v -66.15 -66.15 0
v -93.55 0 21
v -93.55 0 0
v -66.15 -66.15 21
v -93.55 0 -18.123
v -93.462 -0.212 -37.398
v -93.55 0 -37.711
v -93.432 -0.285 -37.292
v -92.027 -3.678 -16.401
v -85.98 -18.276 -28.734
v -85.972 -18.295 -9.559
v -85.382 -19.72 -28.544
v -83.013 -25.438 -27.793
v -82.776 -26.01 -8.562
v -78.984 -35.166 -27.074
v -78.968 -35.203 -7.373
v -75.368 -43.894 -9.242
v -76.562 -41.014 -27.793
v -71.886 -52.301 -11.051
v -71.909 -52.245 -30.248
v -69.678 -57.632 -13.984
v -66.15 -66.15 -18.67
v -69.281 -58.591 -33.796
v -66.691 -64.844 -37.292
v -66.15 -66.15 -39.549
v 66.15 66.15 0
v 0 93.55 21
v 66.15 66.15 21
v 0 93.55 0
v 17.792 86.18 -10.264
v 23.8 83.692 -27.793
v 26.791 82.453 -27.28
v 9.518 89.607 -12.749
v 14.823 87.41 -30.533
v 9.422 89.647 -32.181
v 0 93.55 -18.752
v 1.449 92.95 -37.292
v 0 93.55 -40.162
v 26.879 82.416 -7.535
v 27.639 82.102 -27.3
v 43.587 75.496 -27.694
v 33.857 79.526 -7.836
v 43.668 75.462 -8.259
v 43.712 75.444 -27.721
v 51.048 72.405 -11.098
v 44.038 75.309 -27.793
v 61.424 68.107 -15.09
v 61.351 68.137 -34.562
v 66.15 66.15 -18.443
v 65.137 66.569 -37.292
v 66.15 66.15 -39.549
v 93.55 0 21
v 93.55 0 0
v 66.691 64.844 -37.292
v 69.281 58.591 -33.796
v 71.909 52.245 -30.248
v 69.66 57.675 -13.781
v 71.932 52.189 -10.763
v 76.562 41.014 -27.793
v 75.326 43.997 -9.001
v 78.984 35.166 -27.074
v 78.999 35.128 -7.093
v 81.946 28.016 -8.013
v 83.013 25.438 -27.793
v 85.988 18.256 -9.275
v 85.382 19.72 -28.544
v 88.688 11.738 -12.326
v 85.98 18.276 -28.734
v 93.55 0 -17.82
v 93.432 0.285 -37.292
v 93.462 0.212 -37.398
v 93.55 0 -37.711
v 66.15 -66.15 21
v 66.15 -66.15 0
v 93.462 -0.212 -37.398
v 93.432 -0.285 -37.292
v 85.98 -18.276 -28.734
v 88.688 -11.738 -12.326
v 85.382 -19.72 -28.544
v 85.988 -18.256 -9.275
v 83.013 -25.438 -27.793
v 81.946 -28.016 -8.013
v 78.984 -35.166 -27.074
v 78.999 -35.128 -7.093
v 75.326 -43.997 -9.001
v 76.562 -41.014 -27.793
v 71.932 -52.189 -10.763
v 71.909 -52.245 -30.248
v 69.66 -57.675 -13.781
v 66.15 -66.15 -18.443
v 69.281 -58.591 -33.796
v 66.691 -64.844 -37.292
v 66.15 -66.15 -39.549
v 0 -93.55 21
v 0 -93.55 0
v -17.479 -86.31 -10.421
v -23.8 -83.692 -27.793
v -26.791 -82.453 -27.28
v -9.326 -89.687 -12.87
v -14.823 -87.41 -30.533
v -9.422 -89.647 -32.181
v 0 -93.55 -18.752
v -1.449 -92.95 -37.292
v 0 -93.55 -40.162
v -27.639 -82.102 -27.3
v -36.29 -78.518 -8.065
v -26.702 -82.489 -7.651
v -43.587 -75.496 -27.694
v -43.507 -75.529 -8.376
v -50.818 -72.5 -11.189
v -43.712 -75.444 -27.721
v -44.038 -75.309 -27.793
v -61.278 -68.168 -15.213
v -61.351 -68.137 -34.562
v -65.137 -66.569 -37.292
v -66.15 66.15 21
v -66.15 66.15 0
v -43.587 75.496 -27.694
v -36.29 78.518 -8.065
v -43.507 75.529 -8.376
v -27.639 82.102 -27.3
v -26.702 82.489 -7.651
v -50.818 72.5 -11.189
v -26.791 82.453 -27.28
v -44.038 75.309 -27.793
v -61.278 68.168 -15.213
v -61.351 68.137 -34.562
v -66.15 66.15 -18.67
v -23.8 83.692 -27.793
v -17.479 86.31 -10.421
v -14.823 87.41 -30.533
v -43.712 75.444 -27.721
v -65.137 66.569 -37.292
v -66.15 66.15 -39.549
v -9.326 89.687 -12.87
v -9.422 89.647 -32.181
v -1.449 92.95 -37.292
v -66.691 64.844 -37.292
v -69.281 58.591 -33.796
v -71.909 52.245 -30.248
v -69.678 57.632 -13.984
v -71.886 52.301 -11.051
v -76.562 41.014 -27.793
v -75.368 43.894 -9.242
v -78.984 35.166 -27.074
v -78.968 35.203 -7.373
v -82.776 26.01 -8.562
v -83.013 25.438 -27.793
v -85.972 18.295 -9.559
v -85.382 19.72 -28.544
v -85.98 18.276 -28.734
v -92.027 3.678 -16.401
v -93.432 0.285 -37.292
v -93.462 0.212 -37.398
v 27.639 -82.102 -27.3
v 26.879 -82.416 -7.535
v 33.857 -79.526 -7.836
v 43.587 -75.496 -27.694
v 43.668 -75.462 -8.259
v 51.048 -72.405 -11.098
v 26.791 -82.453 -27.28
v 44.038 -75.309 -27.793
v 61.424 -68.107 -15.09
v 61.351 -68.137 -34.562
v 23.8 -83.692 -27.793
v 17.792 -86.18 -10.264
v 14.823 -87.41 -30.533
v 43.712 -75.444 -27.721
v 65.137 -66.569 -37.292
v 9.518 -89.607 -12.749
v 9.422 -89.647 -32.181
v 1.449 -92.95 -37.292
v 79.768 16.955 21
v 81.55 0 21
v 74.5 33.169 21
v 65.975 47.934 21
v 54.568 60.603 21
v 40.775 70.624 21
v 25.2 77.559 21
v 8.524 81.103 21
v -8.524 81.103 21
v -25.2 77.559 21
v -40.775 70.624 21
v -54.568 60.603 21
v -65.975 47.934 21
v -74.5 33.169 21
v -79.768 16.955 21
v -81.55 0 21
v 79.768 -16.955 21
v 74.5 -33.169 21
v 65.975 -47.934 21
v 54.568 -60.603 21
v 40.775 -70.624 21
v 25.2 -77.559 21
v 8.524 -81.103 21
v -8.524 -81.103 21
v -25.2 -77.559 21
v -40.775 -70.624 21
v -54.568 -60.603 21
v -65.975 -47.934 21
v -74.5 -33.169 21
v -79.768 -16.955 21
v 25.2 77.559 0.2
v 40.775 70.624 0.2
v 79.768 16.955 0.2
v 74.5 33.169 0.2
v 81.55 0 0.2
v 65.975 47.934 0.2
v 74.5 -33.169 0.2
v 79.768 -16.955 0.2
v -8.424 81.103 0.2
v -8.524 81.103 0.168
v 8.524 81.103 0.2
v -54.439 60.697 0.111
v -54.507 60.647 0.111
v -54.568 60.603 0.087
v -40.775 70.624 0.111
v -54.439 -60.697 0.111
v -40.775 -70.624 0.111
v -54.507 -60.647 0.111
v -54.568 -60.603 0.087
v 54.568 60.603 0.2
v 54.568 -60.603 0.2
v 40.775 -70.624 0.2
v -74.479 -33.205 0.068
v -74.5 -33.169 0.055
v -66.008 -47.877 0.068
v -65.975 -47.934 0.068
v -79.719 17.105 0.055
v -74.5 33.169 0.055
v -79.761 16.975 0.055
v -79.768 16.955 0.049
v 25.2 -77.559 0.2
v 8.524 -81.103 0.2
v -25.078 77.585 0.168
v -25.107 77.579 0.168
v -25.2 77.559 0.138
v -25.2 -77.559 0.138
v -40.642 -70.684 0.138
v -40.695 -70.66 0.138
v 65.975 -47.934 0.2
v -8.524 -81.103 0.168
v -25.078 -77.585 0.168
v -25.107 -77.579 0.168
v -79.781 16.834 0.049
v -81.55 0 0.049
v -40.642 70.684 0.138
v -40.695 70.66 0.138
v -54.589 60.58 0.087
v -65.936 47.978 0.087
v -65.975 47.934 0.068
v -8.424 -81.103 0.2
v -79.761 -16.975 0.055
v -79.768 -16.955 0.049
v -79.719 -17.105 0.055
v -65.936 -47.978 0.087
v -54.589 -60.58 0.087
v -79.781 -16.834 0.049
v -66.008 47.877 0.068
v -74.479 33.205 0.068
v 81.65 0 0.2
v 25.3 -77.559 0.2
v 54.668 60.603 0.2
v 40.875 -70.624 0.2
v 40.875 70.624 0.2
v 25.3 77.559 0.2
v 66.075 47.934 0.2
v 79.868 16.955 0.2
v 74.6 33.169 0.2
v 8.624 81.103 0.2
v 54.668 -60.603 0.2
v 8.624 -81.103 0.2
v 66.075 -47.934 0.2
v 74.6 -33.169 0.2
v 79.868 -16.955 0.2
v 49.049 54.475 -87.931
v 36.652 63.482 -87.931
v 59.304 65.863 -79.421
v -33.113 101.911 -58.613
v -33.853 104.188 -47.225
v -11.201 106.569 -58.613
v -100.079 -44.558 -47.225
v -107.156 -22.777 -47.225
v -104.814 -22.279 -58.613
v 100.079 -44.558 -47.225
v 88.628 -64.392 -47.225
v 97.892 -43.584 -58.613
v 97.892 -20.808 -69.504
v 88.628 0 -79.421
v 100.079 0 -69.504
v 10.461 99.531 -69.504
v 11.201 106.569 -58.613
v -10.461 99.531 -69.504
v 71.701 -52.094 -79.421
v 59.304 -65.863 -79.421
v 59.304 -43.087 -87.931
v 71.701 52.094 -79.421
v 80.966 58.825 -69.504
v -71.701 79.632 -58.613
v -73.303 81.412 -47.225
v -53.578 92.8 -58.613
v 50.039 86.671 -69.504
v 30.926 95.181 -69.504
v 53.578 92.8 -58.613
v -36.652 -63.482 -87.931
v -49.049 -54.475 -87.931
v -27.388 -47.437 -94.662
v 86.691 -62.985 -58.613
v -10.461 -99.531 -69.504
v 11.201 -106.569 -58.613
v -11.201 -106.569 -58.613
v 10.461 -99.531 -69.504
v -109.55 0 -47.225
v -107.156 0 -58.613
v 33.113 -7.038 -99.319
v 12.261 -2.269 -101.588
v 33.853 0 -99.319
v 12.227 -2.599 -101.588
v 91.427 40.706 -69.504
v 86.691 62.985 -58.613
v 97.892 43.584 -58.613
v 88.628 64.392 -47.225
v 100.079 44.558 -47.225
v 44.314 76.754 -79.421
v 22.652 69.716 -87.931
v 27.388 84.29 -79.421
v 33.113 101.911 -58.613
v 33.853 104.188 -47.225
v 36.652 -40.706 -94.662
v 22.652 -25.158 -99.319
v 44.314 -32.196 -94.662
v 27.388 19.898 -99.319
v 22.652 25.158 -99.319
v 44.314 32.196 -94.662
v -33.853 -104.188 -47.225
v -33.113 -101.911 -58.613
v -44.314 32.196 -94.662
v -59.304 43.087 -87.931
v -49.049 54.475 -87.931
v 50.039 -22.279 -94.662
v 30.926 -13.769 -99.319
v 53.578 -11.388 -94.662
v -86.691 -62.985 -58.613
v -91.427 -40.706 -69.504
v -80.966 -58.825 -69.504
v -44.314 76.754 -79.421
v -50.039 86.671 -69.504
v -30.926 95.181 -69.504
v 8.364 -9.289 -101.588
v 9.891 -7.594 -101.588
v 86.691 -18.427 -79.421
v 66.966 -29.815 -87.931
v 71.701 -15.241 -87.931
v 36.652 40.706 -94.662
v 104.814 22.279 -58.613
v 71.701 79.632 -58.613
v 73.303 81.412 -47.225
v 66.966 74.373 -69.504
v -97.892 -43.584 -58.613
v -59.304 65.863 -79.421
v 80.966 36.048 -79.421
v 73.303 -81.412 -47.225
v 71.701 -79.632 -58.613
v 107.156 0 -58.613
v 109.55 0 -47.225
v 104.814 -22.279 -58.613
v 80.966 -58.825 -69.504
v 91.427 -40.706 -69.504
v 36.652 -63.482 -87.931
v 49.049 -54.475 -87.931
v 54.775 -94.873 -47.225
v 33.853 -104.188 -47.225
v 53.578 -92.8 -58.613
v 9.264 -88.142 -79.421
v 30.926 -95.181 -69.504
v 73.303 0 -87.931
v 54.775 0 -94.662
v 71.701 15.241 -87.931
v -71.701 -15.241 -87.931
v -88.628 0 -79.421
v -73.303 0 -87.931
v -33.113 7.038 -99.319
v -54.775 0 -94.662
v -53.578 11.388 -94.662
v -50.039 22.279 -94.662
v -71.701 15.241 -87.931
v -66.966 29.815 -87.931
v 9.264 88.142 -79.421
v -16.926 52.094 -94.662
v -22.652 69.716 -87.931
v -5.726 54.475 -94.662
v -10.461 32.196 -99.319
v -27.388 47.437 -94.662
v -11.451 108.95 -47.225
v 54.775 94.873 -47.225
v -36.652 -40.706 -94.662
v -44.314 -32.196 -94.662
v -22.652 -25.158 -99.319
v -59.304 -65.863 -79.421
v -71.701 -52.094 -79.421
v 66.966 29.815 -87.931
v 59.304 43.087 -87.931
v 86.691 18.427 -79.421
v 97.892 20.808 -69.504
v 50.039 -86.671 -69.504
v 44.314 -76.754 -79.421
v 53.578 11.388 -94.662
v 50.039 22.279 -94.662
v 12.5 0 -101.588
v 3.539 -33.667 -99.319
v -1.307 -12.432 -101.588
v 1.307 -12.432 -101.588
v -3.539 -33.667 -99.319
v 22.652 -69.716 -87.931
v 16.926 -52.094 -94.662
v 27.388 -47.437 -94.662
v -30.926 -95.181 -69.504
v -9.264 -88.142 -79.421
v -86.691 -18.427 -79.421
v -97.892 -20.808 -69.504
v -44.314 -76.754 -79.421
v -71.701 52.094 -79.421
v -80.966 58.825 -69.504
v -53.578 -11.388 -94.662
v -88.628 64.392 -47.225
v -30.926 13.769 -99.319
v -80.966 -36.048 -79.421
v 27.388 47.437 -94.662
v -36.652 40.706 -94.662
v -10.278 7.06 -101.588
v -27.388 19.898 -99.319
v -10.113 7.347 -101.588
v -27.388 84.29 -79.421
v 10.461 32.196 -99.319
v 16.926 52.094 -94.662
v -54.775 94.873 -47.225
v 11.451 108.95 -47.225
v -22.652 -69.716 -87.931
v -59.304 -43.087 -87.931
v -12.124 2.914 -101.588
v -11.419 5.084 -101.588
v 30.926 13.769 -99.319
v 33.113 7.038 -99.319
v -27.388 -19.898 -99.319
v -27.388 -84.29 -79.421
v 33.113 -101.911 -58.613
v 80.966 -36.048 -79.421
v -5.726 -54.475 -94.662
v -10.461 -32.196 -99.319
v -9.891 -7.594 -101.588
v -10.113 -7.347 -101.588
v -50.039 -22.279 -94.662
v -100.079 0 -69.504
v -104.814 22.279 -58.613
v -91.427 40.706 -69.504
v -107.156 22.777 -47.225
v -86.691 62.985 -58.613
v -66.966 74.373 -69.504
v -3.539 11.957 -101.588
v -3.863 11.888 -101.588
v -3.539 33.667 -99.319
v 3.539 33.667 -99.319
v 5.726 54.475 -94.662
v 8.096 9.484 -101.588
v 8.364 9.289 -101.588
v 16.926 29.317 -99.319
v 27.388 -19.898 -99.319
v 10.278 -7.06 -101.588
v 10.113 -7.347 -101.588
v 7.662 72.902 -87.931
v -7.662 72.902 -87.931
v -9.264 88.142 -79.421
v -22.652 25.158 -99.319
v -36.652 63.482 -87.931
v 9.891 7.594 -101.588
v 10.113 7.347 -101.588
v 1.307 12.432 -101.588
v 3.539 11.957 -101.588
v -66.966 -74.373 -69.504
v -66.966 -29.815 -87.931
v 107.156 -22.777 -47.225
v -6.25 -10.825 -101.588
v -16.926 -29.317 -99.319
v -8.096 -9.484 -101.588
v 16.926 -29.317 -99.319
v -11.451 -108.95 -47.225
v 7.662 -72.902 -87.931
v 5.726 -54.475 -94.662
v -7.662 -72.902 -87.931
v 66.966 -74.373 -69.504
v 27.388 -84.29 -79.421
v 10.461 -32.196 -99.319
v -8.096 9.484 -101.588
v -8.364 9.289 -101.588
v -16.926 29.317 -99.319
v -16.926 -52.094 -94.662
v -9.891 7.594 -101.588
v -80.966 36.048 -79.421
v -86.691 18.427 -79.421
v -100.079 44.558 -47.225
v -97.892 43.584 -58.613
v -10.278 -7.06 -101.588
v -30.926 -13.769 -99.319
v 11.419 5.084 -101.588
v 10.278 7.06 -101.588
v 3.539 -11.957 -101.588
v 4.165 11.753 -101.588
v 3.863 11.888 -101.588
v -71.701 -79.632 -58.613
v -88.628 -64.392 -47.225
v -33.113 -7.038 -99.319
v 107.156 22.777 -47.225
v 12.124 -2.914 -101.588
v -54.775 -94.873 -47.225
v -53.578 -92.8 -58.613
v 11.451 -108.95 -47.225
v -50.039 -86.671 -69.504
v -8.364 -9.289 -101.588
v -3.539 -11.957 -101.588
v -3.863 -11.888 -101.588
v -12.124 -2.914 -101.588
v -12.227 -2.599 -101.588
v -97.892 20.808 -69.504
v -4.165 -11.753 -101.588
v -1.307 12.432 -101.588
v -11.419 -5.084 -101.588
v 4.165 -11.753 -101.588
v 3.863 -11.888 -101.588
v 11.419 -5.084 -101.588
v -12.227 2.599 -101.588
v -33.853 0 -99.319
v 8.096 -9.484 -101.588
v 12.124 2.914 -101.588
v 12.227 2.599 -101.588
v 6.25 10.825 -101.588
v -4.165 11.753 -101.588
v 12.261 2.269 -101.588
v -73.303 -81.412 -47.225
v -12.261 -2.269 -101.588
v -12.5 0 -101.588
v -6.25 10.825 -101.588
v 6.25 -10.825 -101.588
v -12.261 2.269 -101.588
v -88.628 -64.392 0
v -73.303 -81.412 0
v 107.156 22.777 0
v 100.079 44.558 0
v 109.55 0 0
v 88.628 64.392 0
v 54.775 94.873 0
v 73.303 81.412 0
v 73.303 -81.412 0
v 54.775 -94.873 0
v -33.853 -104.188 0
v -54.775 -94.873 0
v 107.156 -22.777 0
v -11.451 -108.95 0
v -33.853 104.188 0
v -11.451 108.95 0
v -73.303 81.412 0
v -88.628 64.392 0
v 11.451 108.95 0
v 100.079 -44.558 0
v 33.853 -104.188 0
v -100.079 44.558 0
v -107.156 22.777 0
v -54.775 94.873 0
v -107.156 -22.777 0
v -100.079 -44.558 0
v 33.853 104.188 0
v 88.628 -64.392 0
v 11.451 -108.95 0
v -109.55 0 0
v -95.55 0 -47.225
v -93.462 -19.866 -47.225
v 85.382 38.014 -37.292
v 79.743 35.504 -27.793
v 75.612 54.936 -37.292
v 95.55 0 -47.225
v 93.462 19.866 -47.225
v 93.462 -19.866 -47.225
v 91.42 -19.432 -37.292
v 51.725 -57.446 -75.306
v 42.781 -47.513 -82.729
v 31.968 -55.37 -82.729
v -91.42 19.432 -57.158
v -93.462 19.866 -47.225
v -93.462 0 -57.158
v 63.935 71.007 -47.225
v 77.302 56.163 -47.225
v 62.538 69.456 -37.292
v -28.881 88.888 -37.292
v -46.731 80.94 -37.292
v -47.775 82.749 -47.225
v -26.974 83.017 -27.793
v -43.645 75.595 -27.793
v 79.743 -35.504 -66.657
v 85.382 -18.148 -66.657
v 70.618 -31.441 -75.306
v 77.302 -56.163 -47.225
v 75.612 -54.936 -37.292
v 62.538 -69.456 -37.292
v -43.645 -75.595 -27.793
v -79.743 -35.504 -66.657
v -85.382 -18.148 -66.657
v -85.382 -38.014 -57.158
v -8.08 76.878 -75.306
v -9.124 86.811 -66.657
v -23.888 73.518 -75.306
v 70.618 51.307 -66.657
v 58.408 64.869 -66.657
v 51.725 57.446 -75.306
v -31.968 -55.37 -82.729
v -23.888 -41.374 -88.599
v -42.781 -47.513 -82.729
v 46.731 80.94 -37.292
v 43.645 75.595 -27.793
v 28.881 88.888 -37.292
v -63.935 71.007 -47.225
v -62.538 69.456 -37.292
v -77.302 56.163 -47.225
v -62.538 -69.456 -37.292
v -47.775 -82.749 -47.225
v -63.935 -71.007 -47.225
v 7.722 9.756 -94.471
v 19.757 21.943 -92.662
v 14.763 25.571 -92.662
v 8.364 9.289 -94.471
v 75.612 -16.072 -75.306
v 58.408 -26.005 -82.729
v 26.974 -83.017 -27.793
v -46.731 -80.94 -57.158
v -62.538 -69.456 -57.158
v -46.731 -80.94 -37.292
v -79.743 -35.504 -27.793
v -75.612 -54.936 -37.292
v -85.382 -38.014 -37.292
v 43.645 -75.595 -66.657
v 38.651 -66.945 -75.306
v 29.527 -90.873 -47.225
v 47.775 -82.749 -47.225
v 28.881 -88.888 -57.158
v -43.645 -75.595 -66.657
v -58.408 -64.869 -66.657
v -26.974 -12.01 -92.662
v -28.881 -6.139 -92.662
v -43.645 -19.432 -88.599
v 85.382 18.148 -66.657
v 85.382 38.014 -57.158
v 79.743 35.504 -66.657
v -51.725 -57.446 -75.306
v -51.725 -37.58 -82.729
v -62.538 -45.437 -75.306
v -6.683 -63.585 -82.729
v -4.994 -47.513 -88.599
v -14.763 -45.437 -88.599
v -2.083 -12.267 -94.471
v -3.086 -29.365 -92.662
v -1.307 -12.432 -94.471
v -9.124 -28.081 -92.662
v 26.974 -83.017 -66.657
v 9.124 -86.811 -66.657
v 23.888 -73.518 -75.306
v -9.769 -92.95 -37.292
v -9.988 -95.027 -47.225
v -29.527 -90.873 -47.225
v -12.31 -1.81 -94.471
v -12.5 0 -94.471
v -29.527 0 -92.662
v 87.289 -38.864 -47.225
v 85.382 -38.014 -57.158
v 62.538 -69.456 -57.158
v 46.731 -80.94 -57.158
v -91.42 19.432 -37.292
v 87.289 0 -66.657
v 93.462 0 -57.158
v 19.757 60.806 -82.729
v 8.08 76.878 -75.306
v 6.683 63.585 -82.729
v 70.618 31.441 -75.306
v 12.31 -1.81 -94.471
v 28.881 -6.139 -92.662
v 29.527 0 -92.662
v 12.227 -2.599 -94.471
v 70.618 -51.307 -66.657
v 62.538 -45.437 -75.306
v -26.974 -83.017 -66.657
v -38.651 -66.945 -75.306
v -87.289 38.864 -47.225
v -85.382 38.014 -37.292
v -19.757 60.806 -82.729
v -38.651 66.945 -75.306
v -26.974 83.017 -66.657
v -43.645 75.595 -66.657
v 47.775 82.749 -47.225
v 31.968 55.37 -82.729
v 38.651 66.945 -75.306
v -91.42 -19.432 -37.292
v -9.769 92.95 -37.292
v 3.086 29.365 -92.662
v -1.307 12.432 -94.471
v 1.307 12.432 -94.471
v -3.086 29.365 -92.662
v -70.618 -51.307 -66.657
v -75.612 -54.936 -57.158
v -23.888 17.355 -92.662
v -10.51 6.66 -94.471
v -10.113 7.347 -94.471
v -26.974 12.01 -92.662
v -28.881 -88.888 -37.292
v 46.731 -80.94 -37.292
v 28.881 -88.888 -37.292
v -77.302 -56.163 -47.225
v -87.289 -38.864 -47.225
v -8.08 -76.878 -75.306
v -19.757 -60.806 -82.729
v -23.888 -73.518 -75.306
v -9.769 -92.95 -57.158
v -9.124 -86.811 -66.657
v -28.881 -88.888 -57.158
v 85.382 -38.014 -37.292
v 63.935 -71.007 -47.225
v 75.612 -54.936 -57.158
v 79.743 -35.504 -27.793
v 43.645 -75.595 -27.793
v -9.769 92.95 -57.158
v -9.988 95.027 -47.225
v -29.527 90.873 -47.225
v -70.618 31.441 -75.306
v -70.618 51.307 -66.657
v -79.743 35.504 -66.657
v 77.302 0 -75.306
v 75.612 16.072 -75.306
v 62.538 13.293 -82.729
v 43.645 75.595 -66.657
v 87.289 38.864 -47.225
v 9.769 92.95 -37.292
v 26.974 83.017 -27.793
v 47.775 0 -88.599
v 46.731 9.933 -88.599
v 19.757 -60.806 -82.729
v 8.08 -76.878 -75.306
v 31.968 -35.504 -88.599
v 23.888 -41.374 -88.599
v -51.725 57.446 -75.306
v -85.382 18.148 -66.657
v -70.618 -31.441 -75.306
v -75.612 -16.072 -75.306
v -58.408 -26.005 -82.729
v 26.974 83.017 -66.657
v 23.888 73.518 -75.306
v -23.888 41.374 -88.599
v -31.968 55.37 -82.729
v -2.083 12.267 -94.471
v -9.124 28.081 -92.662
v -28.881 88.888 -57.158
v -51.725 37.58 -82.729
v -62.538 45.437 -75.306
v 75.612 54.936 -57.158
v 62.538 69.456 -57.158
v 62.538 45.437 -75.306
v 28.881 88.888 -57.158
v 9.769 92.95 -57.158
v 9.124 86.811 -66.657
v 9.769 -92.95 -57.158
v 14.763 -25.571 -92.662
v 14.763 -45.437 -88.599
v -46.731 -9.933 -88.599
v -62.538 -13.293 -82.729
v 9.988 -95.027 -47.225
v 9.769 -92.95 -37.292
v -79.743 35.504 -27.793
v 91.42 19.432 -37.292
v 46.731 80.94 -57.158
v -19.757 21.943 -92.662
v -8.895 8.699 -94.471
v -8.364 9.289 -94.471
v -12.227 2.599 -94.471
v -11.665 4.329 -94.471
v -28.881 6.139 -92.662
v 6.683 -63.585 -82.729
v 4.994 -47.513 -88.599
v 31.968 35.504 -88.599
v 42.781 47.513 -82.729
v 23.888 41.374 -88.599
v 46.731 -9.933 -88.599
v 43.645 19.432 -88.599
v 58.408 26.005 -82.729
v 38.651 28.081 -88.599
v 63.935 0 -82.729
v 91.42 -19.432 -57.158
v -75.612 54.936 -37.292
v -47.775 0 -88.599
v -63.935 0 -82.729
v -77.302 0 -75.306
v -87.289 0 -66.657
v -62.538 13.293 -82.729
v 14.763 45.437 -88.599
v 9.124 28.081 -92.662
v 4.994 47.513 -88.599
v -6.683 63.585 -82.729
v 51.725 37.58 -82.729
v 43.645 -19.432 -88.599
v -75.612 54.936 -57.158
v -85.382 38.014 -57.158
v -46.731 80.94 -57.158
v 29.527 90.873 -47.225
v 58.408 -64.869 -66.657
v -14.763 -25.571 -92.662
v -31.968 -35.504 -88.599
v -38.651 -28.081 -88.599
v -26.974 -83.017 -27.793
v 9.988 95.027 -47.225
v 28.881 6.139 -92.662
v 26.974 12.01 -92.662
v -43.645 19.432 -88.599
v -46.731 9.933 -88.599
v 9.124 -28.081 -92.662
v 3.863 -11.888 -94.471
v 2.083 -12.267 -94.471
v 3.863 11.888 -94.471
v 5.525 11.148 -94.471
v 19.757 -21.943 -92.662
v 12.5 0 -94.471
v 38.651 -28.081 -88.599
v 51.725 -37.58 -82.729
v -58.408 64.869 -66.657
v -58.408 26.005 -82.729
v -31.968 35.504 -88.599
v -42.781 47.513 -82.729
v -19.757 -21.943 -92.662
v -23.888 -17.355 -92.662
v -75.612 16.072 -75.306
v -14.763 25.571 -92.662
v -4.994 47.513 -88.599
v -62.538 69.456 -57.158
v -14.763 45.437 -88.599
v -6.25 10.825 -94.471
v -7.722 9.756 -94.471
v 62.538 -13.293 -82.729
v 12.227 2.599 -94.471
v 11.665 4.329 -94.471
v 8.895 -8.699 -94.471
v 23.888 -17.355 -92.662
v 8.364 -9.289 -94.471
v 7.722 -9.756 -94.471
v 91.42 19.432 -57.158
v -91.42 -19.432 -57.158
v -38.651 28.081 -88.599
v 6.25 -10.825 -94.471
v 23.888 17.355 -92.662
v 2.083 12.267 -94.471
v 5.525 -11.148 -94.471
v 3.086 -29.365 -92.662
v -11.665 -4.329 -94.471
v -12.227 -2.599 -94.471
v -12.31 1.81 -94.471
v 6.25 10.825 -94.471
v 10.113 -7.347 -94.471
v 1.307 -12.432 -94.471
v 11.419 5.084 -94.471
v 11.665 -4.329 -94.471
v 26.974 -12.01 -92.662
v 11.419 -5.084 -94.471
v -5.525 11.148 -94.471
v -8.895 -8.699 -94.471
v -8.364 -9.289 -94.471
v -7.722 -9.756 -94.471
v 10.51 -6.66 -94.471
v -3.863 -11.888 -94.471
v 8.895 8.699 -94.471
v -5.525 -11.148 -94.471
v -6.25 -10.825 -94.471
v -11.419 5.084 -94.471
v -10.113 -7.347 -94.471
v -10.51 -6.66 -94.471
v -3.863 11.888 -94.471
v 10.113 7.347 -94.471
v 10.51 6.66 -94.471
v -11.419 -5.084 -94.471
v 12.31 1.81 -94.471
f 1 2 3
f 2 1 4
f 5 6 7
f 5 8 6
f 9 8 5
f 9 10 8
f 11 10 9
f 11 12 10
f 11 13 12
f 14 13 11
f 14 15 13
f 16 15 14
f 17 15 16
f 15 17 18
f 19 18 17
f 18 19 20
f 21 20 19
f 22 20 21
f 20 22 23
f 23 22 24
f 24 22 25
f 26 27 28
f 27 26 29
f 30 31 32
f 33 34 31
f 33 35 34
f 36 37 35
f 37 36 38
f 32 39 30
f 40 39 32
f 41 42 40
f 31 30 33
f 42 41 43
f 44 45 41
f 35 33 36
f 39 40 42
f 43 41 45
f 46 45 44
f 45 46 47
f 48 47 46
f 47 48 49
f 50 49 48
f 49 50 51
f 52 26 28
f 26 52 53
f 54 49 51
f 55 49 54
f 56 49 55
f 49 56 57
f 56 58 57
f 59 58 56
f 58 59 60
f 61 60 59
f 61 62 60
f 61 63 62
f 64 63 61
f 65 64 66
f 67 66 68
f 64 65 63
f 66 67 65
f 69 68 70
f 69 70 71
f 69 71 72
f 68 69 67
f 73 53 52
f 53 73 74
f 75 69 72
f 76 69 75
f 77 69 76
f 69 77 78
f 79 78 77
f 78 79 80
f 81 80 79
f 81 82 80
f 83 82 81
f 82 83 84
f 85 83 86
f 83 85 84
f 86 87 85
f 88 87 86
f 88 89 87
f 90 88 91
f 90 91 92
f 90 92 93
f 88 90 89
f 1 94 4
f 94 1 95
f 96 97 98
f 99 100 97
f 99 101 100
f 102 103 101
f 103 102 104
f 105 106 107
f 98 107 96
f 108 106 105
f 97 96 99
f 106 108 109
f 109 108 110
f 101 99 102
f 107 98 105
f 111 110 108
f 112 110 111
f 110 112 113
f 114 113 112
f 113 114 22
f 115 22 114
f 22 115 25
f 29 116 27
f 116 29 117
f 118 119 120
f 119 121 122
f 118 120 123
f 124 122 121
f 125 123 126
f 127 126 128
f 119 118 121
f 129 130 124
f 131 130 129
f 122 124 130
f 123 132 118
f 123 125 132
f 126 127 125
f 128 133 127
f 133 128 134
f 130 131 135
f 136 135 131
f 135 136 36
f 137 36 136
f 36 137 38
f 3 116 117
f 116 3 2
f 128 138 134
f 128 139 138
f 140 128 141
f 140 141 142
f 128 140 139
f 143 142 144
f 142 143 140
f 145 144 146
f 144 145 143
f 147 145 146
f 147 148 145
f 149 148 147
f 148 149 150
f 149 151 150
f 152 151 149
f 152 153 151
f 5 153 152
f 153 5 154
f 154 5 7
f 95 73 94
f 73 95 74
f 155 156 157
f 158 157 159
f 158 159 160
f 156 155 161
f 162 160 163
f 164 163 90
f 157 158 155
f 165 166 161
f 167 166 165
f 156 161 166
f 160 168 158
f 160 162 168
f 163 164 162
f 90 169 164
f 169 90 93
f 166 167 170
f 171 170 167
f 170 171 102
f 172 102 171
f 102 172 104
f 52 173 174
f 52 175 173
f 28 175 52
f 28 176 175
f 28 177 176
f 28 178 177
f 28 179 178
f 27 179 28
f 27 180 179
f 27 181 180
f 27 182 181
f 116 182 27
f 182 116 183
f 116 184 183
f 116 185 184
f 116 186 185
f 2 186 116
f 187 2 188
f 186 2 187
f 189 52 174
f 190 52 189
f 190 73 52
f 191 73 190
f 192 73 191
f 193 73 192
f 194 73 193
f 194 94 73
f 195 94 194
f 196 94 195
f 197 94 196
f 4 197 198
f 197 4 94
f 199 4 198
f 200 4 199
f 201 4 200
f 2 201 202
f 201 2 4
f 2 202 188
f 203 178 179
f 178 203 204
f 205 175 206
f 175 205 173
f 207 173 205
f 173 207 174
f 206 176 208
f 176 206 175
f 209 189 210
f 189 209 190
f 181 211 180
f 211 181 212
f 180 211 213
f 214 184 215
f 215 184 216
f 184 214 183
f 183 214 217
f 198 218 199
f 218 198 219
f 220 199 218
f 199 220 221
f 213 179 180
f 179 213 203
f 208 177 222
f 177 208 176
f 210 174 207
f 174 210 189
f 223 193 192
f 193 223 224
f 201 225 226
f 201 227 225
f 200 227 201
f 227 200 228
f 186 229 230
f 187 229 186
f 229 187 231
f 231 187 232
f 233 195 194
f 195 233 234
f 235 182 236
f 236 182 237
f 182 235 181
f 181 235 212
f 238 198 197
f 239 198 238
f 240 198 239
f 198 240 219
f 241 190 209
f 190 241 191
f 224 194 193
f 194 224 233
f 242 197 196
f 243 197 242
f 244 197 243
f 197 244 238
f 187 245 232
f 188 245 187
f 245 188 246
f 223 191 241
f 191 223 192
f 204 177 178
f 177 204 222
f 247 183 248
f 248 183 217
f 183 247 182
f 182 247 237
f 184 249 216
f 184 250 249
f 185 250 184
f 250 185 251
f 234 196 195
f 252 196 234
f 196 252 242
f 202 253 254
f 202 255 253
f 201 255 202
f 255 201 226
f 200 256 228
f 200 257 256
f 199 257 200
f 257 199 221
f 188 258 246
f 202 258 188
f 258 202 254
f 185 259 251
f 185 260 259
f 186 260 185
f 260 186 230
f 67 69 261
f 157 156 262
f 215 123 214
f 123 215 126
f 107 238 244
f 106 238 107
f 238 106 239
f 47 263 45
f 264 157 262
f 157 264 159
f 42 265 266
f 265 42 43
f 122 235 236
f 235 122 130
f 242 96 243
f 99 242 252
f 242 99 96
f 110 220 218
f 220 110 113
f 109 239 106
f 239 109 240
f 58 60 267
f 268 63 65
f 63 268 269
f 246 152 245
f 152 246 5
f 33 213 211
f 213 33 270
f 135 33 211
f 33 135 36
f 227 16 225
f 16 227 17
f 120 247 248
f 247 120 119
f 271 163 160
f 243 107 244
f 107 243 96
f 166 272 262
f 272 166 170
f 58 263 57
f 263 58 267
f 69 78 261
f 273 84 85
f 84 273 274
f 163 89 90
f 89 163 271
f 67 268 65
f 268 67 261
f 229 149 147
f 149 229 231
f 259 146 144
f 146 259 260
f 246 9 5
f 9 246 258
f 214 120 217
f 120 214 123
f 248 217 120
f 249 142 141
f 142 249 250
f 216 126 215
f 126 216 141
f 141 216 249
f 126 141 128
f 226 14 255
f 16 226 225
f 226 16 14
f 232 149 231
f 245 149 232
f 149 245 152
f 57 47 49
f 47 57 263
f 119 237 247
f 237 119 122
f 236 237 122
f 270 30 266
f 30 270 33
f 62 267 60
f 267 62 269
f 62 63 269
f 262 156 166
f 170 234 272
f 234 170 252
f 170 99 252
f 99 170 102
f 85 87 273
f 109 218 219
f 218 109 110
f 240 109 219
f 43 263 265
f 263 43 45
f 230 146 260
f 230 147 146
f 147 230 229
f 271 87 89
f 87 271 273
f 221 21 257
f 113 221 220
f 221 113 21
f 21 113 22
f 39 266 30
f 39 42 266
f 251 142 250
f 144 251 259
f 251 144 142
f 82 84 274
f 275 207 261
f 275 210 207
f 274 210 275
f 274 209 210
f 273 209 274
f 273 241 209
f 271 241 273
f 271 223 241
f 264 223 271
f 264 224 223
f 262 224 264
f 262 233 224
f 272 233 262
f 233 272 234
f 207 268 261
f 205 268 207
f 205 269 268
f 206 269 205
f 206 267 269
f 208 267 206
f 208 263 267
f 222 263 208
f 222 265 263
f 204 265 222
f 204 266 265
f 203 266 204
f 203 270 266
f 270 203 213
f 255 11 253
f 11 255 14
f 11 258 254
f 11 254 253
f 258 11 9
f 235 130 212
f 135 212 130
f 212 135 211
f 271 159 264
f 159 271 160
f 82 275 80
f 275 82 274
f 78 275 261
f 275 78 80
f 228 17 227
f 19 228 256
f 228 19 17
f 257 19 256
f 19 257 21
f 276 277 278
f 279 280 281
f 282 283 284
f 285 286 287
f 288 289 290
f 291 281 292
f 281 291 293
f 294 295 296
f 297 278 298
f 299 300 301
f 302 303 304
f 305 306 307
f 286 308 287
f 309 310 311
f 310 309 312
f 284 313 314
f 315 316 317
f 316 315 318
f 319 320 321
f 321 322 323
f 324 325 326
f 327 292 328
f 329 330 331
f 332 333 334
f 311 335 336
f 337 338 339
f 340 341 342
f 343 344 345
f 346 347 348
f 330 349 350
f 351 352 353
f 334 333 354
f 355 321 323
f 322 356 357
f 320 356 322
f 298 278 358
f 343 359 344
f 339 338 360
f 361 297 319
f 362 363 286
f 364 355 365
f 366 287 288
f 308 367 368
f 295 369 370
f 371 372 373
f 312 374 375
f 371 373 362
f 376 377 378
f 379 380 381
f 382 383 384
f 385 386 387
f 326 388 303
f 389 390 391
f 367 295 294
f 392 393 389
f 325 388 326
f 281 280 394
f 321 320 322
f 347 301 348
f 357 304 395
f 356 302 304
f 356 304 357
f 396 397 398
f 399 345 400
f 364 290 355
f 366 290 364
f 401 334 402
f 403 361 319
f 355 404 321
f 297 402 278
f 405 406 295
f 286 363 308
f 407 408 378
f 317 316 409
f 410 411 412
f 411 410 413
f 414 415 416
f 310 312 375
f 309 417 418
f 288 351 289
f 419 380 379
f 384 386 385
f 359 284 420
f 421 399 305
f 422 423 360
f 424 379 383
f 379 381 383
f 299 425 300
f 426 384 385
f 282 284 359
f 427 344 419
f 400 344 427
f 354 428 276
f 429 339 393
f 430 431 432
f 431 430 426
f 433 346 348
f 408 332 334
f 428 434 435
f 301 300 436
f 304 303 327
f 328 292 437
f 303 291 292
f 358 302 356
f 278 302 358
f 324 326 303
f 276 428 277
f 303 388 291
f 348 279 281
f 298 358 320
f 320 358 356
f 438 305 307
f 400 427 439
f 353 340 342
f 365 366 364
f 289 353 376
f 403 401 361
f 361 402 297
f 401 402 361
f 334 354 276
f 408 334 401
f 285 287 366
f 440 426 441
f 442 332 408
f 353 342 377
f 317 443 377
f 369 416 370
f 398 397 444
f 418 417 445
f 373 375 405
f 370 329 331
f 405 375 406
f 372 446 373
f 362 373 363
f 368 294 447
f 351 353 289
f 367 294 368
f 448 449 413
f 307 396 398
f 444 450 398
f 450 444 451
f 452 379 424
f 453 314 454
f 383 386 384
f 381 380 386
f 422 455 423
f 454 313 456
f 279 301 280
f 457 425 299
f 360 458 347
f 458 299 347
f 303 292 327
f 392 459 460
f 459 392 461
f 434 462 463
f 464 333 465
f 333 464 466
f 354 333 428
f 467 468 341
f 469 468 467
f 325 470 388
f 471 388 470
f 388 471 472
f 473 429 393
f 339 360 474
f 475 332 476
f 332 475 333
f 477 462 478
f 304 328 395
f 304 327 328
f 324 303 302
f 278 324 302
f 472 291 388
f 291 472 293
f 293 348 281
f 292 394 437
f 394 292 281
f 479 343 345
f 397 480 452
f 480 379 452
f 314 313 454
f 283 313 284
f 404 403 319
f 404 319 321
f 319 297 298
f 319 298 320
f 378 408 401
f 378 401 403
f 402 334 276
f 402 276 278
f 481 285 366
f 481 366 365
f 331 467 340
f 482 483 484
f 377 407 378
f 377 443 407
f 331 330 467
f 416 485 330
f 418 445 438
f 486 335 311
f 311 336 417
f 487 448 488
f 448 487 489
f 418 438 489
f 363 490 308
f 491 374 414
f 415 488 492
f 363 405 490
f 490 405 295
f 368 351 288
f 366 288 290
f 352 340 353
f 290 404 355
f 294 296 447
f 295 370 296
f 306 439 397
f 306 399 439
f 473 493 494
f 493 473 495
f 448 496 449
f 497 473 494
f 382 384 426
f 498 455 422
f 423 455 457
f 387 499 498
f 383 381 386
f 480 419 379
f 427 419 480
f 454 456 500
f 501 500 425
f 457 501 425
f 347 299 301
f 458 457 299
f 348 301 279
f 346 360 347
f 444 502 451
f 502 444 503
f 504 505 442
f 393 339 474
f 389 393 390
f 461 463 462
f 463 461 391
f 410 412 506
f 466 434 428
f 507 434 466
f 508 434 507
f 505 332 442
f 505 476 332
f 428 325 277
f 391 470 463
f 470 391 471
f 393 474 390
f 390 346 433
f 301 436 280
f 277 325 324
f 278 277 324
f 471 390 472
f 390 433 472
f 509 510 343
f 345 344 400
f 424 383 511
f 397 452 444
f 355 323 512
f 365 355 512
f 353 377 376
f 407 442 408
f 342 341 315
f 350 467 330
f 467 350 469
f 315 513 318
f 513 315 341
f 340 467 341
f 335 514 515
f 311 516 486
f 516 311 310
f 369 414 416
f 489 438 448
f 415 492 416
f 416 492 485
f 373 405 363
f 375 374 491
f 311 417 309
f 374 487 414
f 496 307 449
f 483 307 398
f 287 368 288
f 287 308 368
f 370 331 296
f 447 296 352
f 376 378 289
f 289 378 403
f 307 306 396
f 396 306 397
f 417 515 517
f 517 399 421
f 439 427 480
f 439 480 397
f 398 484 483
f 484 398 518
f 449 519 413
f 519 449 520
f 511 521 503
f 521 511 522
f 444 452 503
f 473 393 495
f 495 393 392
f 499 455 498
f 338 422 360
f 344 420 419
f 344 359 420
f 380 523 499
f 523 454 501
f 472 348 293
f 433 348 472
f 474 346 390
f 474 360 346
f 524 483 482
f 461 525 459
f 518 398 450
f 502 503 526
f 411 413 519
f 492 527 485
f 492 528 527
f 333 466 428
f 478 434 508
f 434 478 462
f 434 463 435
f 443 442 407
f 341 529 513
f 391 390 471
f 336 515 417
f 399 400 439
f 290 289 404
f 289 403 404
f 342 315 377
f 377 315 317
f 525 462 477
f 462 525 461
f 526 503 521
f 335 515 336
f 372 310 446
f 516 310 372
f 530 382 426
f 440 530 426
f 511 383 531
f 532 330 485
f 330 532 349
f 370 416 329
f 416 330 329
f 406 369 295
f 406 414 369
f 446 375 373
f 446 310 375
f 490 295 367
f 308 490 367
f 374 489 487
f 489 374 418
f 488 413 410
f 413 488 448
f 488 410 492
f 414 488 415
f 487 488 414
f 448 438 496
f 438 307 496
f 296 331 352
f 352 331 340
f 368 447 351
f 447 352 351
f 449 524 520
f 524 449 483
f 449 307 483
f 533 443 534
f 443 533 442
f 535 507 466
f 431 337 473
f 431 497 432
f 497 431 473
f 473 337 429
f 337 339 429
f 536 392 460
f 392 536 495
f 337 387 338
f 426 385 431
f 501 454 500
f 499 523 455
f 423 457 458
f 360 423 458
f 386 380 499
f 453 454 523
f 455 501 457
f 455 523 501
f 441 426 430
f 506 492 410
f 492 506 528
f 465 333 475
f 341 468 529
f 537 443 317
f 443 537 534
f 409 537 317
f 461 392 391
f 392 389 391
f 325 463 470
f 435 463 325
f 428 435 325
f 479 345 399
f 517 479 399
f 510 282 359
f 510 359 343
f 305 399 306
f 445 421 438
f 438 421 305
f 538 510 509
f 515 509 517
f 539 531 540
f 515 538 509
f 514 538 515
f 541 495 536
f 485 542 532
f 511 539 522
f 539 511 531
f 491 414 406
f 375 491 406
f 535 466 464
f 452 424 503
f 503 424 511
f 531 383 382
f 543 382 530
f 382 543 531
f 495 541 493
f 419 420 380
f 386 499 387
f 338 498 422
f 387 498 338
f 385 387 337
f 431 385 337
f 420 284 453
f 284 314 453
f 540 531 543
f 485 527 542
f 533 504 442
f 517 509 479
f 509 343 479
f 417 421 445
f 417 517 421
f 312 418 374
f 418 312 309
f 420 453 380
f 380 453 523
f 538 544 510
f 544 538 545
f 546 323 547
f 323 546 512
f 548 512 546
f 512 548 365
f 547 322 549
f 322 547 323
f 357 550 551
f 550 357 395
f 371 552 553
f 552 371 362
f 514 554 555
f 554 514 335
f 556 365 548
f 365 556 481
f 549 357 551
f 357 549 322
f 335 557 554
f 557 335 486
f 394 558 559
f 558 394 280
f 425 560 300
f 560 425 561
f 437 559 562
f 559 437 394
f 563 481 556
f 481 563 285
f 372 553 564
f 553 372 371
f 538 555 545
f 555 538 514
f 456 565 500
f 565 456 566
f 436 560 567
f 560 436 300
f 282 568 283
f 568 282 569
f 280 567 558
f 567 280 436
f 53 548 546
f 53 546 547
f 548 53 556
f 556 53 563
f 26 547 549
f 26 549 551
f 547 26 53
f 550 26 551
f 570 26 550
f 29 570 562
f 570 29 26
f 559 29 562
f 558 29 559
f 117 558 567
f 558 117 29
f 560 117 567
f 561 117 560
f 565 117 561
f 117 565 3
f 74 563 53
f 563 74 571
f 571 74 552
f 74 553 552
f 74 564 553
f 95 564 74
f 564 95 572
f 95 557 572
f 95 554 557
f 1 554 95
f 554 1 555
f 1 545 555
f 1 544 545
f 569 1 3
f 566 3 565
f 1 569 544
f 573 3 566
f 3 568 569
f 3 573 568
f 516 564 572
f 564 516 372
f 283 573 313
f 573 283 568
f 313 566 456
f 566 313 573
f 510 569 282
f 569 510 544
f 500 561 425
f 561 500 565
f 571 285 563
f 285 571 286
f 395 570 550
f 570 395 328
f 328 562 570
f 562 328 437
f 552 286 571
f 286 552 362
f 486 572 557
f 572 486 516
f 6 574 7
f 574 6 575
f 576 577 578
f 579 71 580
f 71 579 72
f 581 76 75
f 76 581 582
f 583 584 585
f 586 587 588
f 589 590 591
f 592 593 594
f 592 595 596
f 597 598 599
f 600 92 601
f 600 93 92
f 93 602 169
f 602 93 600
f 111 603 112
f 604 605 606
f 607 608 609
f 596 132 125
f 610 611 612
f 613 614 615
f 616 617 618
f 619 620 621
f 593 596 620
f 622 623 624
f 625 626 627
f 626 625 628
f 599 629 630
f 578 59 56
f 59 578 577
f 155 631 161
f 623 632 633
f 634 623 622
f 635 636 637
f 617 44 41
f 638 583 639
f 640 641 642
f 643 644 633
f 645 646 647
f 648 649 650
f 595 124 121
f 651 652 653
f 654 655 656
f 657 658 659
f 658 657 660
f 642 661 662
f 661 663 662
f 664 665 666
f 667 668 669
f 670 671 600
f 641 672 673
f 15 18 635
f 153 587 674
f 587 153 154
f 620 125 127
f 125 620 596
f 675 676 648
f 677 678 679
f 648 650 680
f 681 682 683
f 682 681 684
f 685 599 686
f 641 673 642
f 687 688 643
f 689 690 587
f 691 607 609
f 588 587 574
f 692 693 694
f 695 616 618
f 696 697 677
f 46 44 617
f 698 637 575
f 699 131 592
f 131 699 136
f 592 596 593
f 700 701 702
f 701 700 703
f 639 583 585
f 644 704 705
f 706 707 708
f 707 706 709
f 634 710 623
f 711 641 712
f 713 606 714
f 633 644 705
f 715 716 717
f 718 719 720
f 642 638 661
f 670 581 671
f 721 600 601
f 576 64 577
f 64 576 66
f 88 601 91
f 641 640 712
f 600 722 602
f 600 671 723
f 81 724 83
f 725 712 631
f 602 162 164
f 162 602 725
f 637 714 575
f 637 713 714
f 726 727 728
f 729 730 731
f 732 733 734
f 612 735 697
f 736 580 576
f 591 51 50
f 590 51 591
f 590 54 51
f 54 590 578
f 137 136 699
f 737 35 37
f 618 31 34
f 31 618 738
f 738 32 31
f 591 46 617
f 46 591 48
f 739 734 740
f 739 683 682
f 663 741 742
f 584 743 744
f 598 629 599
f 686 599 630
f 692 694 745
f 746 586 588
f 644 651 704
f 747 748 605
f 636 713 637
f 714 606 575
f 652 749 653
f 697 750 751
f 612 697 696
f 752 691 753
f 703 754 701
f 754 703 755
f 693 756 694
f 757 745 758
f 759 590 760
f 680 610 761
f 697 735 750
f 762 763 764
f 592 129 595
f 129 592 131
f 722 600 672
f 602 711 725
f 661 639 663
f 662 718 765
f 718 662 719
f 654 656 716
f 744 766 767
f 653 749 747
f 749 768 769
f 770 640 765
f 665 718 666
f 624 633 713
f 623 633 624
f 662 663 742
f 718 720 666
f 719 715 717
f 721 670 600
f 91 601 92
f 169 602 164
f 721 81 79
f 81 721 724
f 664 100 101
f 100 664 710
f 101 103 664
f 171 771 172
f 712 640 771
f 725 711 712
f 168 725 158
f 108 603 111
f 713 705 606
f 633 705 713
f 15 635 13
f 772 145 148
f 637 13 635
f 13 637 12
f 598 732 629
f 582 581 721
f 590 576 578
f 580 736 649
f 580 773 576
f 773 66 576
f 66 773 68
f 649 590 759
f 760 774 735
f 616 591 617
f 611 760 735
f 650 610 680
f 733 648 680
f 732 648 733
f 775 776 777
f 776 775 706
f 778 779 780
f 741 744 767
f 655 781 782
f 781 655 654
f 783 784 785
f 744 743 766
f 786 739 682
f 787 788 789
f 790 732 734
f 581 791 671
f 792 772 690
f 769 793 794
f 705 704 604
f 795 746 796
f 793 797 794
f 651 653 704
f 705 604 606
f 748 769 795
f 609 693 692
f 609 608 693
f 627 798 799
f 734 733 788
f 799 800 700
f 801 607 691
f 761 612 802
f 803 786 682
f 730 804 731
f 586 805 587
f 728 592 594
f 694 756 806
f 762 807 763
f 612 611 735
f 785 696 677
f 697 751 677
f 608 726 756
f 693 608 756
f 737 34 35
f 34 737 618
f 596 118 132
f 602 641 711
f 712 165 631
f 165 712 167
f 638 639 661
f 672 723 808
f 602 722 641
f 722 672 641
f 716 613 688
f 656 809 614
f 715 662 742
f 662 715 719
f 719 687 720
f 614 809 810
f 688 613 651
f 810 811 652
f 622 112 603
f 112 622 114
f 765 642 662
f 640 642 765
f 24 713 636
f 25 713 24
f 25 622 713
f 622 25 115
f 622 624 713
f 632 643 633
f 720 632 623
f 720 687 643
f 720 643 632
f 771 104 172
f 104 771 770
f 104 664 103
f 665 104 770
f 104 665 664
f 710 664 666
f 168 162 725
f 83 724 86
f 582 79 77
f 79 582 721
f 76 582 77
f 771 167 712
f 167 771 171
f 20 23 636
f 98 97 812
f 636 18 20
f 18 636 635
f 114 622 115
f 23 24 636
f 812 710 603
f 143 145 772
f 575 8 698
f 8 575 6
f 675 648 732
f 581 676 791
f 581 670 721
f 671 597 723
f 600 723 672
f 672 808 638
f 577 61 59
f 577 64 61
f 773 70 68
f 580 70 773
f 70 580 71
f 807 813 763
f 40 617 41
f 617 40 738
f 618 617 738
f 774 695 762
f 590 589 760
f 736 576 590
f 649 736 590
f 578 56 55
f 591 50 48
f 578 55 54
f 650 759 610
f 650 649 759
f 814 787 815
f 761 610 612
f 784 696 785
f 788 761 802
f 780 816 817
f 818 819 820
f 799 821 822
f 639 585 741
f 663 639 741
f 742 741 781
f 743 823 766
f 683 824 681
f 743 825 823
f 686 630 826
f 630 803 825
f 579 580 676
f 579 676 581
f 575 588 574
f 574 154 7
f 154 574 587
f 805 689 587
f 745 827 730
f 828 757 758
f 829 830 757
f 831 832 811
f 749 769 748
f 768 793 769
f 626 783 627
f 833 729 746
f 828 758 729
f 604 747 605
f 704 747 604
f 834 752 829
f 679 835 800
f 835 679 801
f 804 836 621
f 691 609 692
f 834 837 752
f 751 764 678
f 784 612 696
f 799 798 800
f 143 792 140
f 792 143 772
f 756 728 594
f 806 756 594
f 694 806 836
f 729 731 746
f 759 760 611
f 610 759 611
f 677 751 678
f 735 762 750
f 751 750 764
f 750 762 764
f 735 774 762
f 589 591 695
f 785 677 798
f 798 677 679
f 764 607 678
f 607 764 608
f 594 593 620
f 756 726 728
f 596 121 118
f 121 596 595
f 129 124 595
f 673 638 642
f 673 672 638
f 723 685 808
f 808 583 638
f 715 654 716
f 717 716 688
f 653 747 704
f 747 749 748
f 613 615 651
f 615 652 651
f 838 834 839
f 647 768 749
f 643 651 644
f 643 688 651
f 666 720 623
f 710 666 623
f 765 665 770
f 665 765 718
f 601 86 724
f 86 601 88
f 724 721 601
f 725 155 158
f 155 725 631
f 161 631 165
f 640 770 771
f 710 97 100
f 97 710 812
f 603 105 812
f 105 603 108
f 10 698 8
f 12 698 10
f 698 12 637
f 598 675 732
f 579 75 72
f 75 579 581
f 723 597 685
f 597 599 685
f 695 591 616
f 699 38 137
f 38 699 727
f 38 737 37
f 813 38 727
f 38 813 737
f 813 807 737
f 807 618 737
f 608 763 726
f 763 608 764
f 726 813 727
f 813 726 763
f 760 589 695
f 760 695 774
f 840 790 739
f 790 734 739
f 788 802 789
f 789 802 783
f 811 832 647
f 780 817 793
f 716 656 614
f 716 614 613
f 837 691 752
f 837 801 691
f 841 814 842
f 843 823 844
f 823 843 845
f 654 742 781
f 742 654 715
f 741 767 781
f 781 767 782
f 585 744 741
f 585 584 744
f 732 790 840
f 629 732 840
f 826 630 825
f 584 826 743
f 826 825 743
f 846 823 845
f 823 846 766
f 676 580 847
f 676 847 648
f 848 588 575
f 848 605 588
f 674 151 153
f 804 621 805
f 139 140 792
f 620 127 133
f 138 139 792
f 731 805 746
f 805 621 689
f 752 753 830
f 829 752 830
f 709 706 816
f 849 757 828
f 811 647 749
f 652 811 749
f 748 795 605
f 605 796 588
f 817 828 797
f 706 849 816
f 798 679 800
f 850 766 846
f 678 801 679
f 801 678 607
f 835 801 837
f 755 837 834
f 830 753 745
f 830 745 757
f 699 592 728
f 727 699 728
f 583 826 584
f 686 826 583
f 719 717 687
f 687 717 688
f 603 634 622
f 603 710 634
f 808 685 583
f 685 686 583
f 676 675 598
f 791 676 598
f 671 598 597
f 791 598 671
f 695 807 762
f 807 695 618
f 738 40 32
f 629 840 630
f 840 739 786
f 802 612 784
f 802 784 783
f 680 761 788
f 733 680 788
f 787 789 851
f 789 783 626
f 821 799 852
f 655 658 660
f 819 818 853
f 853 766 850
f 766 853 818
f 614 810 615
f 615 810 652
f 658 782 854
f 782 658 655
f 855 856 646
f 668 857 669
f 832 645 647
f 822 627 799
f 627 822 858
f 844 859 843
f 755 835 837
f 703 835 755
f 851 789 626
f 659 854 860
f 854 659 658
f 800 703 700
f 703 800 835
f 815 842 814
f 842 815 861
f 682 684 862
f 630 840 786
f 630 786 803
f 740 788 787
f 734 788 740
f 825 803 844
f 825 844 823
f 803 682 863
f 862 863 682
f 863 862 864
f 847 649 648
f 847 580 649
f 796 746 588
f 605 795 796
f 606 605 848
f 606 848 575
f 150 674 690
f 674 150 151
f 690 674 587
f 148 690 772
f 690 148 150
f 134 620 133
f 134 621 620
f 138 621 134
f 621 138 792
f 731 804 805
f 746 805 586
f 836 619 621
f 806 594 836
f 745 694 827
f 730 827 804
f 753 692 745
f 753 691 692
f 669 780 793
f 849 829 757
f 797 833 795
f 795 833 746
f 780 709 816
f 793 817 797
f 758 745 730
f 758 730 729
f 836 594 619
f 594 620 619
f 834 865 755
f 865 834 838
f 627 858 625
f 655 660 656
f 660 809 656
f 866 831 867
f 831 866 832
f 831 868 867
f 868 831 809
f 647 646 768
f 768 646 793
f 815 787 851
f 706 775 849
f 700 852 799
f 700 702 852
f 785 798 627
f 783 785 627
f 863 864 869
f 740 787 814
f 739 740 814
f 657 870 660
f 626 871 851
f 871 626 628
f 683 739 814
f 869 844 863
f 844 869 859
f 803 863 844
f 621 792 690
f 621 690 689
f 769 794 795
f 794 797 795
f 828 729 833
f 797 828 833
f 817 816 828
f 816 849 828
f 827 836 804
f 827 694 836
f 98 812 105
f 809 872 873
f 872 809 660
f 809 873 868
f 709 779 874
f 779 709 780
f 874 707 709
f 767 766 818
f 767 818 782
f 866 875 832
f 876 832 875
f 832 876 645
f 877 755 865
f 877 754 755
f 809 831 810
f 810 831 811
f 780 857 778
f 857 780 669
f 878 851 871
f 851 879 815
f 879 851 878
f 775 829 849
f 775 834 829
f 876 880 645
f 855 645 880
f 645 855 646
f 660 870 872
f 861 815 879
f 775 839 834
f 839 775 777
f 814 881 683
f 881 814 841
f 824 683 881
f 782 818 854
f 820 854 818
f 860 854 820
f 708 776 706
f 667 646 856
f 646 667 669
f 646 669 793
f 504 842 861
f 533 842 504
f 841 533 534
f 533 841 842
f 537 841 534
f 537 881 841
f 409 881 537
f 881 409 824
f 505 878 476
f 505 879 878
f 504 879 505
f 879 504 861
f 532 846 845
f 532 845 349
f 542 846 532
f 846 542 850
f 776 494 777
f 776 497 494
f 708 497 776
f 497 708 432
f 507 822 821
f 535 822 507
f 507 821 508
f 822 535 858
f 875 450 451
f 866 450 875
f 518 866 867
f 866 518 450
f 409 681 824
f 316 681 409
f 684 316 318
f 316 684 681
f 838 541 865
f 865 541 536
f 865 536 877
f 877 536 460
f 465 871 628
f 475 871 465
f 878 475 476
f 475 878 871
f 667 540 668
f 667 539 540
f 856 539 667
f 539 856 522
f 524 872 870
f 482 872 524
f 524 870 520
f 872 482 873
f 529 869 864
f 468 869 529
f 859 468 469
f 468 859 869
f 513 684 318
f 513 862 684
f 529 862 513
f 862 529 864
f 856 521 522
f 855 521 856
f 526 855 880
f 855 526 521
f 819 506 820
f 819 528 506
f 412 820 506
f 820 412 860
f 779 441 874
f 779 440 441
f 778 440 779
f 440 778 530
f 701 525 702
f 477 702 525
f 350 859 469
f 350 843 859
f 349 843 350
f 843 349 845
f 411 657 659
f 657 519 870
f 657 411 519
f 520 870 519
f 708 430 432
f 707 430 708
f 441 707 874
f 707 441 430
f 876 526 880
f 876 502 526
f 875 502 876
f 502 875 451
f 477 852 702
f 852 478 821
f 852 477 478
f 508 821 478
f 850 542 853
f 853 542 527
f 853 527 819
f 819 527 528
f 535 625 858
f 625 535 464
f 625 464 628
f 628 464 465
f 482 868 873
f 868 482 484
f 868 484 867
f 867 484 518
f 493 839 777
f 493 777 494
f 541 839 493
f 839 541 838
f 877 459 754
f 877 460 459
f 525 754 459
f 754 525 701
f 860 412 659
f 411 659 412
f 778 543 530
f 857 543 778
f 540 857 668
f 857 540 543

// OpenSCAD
//pipecap.scad

function dia(size) = lookup(size, [
    [1/2,21.3],
    [3/4,26.7],
    [1,33.4],
    [1.25,42.2],
    [1.5,48.3],
    [2,60.3],
    [2.5,73],
    [3,88.9],
    [3.5,101.6],
    [4,114.3],
    [5,141.4],
    [6,168.3],
    [8,219.1],
    [10,273],
    [12,323.8],
    [14,355.6],
    [16,406.4],
    [18,457],
    [20,508],
    [22,559],
    [24,610],
    [26,660],
    [28,711],
    [30,762],
    [32,813],
    [34,864],
    [36,914],
    [38,965],
    [40,1016],
    [42,1067],
    [44,1118],
    [46,1168],
    [48,1219]
    ]);
    
function height(size) = lookup(size, [
    [1/2,25],
    [3/4,25],
    [1,38],
    [1.25,38],
    [1.5,38],
    [2,38],
    [2.5,38],
    [3,51],
    [3.5, 64],
    [4, 64],
    [5, 76],
    [6, 89],
    [8, 102],
    [10, 127],
    [12, 152],
    [14, 165],
    [16, 178],
    [18, 203],
    [20, 229],
    [22, 254],
    [24, 267],
    [26, 267],
    [28, 267],
    [30, 267],
    [32, 267],
    [34, 267],
    [36, 267],
    [38, 305],
    [40, 305],
    [42, 305],
    [44, 343],
    [46, 343],
    [48, 343]
    ]);	
echo(dia(.75),height(1/2));
pipecap(dia(8),14,height(8));
 //Example: pipecap(2,3,38);
//pipecap(d=60.3,t=3,h=38);
//pipecap(d=60.3,t=3,h=38,spigot=false);


module pipecap(d=219.1,t=8.18,h=102,hole=25,spigot=true){
    if(spigot)    
        difference(){
            cylinder(h=3*t,d=d-2*t-4,center=true,$fn=8);
            cylinder(h=1.5*t+2,d=d-4*t);
            translate([0.1,0,-1.5*t])cylinder(h=1.5*t+0.2,r1=d/2-t,r2=d/2-2*t);
    }

    translate([0,0,d/4-h])
    difference(){
        union(){
            difference(){
                scale([1,1,0.5])sphere(d=d);
                cylinder(h=d/2,d=d);
            }
            cylinder(h=h-d/4,d=d);
        }
        union(){
            scale([1,1,0.5])sphere(d=d-2*t);
            cylinder(h=h-d/4+1,d=d-2*t-4,$fn=8);
        }
        translate([0,0,-(h+1)])cylinder(h=h,d=hole);
    }
}
